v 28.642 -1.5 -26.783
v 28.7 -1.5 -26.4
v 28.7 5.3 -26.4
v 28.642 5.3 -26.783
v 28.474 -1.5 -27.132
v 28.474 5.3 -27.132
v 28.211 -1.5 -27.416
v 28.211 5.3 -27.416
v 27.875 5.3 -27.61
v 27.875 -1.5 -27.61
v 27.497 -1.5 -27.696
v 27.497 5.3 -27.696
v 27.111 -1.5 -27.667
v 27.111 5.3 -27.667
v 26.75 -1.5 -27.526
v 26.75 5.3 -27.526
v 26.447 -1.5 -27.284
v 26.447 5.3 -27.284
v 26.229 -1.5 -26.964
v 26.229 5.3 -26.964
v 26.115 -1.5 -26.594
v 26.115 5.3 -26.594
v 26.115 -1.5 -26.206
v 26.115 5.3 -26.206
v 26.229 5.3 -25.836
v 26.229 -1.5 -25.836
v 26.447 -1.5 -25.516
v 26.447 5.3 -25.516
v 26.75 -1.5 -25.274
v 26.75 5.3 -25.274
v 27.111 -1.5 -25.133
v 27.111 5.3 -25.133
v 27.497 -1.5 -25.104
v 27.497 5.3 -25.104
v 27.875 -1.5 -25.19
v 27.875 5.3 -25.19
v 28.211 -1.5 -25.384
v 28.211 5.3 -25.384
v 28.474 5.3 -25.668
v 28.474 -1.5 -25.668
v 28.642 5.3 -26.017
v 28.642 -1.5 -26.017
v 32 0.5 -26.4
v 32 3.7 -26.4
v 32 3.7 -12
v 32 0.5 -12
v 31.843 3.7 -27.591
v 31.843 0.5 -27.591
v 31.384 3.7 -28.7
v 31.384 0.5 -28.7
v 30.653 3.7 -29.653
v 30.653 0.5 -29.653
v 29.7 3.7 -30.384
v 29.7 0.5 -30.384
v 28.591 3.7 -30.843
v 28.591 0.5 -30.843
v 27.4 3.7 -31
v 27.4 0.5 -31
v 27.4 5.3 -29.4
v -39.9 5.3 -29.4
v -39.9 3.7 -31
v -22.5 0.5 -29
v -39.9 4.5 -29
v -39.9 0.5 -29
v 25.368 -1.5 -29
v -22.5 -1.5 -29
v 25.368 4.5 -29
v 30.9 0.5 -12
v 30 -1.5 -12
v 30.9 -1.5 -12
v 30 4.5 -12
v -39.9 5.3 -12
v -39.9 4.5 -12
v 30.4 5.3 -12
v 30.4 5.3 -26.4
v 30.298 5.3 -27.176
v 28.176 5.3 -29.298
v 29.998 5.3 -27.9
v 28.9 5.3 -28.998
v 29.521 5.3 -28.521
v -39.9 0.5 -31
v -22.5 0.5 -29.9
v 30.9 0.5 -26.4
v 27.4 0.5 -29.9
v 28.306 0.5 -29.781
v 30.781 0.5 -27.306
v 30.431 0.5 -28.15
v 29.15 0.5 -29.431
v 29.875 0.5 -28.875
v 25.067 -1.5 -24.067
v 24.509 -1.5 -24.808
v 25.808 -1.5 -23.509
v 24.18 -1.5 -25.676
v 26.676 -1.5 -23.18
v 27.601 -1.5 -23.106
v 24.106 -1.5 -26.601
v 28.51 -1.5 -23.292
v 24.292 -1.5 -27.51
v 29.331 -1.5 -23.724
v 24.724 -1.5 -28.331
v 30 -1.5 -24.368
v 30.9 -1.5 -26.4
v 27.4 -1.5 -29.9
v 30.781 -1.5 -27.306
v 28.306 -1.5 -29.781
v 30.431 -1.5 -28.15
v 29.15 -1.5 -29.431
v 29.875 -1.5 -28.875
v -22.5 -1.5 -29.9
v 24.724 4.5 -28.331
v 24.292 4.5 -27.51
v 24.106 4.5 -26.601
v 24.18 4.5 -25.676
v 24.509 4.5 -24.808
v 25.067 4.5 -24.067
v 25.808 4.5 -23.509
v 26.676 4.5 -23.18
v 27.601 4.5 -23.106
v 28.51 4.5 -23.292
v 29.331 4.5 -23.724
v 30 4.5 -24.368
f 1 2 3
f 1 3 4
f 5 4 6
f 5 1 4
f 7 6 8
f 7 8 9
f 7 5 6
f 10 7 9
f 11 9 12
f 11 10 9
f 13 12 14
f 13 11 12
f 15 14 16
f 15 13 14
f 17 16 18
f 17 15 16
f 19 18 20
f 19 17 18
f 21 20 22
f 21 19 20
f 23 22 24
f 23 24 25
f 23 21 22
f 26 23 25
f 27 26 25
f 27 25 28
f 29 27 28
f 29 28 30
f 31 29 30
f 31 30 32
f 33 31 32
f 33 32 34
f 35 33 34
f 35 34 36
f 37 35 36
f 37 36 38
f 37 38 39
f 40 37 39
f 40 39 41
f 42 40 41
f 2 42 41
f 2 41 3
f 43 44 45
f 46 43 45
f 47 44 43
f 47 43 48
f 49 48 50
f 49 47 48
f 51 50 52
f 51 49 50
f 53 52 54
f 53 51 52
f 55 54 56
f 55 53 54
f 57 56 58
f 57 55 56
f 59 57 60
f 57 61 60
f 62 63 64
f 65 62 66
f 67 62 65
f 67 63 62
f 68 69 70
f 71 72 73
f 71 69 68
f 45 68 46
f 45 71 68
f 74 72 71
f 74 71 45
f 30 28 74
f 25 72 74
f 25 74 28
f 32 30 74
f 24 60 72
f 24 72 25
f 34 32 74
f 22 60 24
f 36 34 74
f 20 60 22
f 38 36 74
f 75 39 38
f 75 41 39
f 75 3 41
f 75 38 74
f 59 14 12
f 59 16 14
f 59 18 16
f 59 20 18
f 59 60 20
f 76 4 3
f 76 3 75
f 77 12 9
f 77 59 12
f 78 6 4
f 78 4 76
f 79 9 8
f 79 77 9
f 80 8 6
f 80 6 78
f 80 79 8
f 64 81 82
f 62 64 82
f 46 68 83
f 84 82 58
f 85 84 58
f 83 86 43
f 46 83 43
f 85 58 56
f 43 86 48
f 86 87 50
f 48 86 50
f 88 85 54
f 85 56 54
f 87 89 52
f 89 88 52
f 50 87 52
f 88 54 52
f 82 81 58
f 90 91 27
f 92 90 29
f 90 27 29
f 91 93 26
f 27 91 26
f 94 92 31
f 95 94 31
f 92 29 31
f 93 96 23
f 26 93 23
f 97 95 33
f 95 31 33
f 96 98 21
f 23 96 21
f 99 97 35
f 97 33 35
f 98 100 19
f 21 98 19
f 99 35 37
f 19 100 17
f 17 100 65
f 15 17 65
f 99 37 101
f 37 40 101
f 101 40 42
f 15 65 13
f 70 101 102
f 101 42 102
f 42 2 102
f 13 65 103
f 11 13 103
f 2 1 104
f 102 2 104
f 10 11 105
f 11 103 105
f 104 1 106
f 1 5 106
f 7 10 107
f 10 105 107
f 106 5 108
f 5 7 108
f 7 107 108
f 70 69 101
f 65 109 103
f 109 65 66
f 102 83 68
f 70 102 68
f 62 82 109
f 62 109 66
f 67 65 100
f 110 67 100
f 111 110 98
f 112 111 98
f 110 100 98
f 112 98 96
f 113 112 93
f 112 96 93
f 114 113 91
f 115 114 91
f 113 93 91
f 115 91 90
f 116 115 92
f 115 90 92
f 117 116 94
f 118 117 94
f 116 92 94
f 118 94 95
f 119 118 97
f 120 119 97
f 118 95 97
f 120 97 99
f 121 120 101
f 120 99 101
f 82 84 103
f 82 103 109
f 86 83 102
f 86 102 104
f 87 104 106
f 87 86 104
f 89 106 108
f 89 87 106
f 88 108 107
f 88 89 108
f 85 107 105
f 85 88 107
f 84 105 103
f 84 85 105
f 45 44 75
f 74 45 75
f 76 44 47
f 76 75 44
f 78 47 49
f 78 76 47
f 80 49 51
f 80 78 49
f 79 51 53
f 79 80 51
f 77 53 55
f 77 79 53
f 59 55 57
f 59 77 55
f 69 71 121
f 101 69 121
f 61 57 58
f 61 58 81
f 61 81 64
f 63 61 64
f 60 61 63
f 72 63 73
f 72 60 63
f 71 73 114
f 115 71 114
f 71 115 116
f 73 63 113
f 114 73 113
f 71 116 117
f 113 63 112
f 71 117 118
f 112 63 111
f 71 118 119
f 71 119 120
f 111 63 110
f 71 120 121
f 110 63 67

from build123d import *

# Parameters (mm, degrees)
SKETCH005_R      = 1.3
EXTRUDE003_DEPTH = 20
EXTRUDE039_DEPTH = 4
EXTRUDE042_DEPTH = 0.8
EXTRUDE002_DEPTH = 6
EXTRUDE037_DEPTH = 2


with BuildPart() as sweep001:
    # Sweep001: sweep along a path in Sketch034
    with BuildLine(Plane.XZ.offset(10)) as sweep001_path:
        Line((32, 12), (32, 26.4))
        ThreePointArc((32, 26.4), (30.652691, 29.652691), (27.4, 31))
        Line((27.4, 31), (-39.9, 31))
    # Sketch035 → Sweep001 (sweep)
    with BuildSketch(Plane.YZ):
        Polygon((5.3, 29.4), (3.7, 31), (3.7, 32), (6, 32), (6, 29.4), align=None)
    sweep(path=sweep001_path.line)


with BuildPart() as fusion030:
    # Sketch005 → Extrude003 (new body)
    with BuildSketch(Plane.XZ.offset(5)):
        with Locations((27.4, 26.4)):
            Circle(SKETCH005_R)
    extrude(amount=-EXTRUDE003_DEPTH)


with BuildPart() as fusion030_1:
    # Extrude003 placement: moved
    add(fusion030.part.moved(Location((0, -4, 0))))

    # Fusion030: union Sweep001
    add(sweep001.part)


with BuildPart() as top003:
    # Sketch028 → Extrude039 (new body)
    with BuildSketch(Plane.XZ.offset(10)):
        with BuildLine():
            ThreePointArc((32, 26.4), (30.652691, 29.652691), (27.4, 31))
            Line((27.4, 31), (-39.9, 31))
            Line((-39.9, 31), (-39.9, 29))
            Line((-39.9, 29), (27.4, 29))
            ThreePointArc((30, 26.4), (29.238478, 28.238478), (27.4, 29))
            Line((30, 12), (30, 26.4))
            Line((32, 12), (30, 12))
            Line((32, 26.4), (32, 12))
        make_face()
    extrude(amount=EXTRUDE039_DEPTH)


with BuildPart() as top003_1:
    # Extrude039 placement: moved
    add(top003.part.moved(Location((0, 14.5, 0))))


with BuildPart() as top002:
    # Sketch031 → Extrude042 (new body)
    with BuildSketch(Plane.XZ.offset(10)):
        with BuildLine():
            ThreePointArc((32, 26.4), (30.652691, 29.652691), (27.4, 31))
            Line((27.4, 31), (-39.9, 31))
            Line((-39.9, 31), (-39.9, 12))
            Line((-39.9, 12), (32, 12))
            Line((32, 26.4), (32, 12))
        make_face()
    extrude(amount=EXTRUDE042_DEPTH)


with BuildPart() as top002_1:
    # Extrude042 placement: moved
    add(top002.part.moved(Location((0, 15.3, 0))))


with BuildPart() as screw_hole_top:
    # Sketch004 → Extrude002 (new body)
    with BuildSketch(Plane.XZ.offset(10)):
        with BuildLine():
            ThreePointArc((25.36776, 29), (25.066548, 24.066548), (30, 24.36776))
            Line((30, 24.36776), (30, 26.4))
            ThreePointArc((30, 26.4), (29.238478, 28.238478), (27.4, 29))
            Line((25.36776, 29), (27.4, 29))
        make_face()
    extrude(amount=-EXTRUDE002_DEPTH)


with BuildPart() as screw_hole_top_1:
    # Extrude002 placement: moved
    add(screw_hole_top.part.moved(Location((0, 8.5, 0))))


with BuildPart() as top:
    # Sketch029 → Extrude037 (new body)
    with BuildSketch(Plane.XZ.offset(10)):
        with BuildLine():
            ThreePointArc((30.9, 26.4), (29.874874, 28.874874), (27.4, 29.9))
            Line((27.4, 29.9), (-22.5, 29.9))
            Line((-22.5, 29.9), (-22.5, 29))
            Line((-22.5, 29), (27.4, 29))
            ThreePointArc((30, 26.4), (29.238478, 28.238478), (27.4, 29))
            Line((30, 12), (30, 26.4))
            Line((30.9, 12), (30, 12))
            Line((30.9, 26.4), (30.9, 12))
        make_face()
    extrude(amount=EXTRUDE037_DEPTH)


with BuildPart() as top_1:
    # Extrude037 placement: moved
    add(top.part.moved(Location((0, 10.5, 0))))

    # Fusion028: union top003, top002, screw hole top
    add(top003_1.part)
    add(top002_1.part)
    add(screw_hole_top_1.part)

    # Cut024: cut Fusion030
    add(fusion030_1.part, mode=Mode.SUBTRACT)


with BuildPart() as part_mirroring001:
    # Part__Mirroring001: instance of top
    add(top_1.part.mirror(Plane(origin=(0, 0, 0), x_dir=(0, 1, 0), z_dir=(0, 0, 1))))


solid = part_mirroring001.part
